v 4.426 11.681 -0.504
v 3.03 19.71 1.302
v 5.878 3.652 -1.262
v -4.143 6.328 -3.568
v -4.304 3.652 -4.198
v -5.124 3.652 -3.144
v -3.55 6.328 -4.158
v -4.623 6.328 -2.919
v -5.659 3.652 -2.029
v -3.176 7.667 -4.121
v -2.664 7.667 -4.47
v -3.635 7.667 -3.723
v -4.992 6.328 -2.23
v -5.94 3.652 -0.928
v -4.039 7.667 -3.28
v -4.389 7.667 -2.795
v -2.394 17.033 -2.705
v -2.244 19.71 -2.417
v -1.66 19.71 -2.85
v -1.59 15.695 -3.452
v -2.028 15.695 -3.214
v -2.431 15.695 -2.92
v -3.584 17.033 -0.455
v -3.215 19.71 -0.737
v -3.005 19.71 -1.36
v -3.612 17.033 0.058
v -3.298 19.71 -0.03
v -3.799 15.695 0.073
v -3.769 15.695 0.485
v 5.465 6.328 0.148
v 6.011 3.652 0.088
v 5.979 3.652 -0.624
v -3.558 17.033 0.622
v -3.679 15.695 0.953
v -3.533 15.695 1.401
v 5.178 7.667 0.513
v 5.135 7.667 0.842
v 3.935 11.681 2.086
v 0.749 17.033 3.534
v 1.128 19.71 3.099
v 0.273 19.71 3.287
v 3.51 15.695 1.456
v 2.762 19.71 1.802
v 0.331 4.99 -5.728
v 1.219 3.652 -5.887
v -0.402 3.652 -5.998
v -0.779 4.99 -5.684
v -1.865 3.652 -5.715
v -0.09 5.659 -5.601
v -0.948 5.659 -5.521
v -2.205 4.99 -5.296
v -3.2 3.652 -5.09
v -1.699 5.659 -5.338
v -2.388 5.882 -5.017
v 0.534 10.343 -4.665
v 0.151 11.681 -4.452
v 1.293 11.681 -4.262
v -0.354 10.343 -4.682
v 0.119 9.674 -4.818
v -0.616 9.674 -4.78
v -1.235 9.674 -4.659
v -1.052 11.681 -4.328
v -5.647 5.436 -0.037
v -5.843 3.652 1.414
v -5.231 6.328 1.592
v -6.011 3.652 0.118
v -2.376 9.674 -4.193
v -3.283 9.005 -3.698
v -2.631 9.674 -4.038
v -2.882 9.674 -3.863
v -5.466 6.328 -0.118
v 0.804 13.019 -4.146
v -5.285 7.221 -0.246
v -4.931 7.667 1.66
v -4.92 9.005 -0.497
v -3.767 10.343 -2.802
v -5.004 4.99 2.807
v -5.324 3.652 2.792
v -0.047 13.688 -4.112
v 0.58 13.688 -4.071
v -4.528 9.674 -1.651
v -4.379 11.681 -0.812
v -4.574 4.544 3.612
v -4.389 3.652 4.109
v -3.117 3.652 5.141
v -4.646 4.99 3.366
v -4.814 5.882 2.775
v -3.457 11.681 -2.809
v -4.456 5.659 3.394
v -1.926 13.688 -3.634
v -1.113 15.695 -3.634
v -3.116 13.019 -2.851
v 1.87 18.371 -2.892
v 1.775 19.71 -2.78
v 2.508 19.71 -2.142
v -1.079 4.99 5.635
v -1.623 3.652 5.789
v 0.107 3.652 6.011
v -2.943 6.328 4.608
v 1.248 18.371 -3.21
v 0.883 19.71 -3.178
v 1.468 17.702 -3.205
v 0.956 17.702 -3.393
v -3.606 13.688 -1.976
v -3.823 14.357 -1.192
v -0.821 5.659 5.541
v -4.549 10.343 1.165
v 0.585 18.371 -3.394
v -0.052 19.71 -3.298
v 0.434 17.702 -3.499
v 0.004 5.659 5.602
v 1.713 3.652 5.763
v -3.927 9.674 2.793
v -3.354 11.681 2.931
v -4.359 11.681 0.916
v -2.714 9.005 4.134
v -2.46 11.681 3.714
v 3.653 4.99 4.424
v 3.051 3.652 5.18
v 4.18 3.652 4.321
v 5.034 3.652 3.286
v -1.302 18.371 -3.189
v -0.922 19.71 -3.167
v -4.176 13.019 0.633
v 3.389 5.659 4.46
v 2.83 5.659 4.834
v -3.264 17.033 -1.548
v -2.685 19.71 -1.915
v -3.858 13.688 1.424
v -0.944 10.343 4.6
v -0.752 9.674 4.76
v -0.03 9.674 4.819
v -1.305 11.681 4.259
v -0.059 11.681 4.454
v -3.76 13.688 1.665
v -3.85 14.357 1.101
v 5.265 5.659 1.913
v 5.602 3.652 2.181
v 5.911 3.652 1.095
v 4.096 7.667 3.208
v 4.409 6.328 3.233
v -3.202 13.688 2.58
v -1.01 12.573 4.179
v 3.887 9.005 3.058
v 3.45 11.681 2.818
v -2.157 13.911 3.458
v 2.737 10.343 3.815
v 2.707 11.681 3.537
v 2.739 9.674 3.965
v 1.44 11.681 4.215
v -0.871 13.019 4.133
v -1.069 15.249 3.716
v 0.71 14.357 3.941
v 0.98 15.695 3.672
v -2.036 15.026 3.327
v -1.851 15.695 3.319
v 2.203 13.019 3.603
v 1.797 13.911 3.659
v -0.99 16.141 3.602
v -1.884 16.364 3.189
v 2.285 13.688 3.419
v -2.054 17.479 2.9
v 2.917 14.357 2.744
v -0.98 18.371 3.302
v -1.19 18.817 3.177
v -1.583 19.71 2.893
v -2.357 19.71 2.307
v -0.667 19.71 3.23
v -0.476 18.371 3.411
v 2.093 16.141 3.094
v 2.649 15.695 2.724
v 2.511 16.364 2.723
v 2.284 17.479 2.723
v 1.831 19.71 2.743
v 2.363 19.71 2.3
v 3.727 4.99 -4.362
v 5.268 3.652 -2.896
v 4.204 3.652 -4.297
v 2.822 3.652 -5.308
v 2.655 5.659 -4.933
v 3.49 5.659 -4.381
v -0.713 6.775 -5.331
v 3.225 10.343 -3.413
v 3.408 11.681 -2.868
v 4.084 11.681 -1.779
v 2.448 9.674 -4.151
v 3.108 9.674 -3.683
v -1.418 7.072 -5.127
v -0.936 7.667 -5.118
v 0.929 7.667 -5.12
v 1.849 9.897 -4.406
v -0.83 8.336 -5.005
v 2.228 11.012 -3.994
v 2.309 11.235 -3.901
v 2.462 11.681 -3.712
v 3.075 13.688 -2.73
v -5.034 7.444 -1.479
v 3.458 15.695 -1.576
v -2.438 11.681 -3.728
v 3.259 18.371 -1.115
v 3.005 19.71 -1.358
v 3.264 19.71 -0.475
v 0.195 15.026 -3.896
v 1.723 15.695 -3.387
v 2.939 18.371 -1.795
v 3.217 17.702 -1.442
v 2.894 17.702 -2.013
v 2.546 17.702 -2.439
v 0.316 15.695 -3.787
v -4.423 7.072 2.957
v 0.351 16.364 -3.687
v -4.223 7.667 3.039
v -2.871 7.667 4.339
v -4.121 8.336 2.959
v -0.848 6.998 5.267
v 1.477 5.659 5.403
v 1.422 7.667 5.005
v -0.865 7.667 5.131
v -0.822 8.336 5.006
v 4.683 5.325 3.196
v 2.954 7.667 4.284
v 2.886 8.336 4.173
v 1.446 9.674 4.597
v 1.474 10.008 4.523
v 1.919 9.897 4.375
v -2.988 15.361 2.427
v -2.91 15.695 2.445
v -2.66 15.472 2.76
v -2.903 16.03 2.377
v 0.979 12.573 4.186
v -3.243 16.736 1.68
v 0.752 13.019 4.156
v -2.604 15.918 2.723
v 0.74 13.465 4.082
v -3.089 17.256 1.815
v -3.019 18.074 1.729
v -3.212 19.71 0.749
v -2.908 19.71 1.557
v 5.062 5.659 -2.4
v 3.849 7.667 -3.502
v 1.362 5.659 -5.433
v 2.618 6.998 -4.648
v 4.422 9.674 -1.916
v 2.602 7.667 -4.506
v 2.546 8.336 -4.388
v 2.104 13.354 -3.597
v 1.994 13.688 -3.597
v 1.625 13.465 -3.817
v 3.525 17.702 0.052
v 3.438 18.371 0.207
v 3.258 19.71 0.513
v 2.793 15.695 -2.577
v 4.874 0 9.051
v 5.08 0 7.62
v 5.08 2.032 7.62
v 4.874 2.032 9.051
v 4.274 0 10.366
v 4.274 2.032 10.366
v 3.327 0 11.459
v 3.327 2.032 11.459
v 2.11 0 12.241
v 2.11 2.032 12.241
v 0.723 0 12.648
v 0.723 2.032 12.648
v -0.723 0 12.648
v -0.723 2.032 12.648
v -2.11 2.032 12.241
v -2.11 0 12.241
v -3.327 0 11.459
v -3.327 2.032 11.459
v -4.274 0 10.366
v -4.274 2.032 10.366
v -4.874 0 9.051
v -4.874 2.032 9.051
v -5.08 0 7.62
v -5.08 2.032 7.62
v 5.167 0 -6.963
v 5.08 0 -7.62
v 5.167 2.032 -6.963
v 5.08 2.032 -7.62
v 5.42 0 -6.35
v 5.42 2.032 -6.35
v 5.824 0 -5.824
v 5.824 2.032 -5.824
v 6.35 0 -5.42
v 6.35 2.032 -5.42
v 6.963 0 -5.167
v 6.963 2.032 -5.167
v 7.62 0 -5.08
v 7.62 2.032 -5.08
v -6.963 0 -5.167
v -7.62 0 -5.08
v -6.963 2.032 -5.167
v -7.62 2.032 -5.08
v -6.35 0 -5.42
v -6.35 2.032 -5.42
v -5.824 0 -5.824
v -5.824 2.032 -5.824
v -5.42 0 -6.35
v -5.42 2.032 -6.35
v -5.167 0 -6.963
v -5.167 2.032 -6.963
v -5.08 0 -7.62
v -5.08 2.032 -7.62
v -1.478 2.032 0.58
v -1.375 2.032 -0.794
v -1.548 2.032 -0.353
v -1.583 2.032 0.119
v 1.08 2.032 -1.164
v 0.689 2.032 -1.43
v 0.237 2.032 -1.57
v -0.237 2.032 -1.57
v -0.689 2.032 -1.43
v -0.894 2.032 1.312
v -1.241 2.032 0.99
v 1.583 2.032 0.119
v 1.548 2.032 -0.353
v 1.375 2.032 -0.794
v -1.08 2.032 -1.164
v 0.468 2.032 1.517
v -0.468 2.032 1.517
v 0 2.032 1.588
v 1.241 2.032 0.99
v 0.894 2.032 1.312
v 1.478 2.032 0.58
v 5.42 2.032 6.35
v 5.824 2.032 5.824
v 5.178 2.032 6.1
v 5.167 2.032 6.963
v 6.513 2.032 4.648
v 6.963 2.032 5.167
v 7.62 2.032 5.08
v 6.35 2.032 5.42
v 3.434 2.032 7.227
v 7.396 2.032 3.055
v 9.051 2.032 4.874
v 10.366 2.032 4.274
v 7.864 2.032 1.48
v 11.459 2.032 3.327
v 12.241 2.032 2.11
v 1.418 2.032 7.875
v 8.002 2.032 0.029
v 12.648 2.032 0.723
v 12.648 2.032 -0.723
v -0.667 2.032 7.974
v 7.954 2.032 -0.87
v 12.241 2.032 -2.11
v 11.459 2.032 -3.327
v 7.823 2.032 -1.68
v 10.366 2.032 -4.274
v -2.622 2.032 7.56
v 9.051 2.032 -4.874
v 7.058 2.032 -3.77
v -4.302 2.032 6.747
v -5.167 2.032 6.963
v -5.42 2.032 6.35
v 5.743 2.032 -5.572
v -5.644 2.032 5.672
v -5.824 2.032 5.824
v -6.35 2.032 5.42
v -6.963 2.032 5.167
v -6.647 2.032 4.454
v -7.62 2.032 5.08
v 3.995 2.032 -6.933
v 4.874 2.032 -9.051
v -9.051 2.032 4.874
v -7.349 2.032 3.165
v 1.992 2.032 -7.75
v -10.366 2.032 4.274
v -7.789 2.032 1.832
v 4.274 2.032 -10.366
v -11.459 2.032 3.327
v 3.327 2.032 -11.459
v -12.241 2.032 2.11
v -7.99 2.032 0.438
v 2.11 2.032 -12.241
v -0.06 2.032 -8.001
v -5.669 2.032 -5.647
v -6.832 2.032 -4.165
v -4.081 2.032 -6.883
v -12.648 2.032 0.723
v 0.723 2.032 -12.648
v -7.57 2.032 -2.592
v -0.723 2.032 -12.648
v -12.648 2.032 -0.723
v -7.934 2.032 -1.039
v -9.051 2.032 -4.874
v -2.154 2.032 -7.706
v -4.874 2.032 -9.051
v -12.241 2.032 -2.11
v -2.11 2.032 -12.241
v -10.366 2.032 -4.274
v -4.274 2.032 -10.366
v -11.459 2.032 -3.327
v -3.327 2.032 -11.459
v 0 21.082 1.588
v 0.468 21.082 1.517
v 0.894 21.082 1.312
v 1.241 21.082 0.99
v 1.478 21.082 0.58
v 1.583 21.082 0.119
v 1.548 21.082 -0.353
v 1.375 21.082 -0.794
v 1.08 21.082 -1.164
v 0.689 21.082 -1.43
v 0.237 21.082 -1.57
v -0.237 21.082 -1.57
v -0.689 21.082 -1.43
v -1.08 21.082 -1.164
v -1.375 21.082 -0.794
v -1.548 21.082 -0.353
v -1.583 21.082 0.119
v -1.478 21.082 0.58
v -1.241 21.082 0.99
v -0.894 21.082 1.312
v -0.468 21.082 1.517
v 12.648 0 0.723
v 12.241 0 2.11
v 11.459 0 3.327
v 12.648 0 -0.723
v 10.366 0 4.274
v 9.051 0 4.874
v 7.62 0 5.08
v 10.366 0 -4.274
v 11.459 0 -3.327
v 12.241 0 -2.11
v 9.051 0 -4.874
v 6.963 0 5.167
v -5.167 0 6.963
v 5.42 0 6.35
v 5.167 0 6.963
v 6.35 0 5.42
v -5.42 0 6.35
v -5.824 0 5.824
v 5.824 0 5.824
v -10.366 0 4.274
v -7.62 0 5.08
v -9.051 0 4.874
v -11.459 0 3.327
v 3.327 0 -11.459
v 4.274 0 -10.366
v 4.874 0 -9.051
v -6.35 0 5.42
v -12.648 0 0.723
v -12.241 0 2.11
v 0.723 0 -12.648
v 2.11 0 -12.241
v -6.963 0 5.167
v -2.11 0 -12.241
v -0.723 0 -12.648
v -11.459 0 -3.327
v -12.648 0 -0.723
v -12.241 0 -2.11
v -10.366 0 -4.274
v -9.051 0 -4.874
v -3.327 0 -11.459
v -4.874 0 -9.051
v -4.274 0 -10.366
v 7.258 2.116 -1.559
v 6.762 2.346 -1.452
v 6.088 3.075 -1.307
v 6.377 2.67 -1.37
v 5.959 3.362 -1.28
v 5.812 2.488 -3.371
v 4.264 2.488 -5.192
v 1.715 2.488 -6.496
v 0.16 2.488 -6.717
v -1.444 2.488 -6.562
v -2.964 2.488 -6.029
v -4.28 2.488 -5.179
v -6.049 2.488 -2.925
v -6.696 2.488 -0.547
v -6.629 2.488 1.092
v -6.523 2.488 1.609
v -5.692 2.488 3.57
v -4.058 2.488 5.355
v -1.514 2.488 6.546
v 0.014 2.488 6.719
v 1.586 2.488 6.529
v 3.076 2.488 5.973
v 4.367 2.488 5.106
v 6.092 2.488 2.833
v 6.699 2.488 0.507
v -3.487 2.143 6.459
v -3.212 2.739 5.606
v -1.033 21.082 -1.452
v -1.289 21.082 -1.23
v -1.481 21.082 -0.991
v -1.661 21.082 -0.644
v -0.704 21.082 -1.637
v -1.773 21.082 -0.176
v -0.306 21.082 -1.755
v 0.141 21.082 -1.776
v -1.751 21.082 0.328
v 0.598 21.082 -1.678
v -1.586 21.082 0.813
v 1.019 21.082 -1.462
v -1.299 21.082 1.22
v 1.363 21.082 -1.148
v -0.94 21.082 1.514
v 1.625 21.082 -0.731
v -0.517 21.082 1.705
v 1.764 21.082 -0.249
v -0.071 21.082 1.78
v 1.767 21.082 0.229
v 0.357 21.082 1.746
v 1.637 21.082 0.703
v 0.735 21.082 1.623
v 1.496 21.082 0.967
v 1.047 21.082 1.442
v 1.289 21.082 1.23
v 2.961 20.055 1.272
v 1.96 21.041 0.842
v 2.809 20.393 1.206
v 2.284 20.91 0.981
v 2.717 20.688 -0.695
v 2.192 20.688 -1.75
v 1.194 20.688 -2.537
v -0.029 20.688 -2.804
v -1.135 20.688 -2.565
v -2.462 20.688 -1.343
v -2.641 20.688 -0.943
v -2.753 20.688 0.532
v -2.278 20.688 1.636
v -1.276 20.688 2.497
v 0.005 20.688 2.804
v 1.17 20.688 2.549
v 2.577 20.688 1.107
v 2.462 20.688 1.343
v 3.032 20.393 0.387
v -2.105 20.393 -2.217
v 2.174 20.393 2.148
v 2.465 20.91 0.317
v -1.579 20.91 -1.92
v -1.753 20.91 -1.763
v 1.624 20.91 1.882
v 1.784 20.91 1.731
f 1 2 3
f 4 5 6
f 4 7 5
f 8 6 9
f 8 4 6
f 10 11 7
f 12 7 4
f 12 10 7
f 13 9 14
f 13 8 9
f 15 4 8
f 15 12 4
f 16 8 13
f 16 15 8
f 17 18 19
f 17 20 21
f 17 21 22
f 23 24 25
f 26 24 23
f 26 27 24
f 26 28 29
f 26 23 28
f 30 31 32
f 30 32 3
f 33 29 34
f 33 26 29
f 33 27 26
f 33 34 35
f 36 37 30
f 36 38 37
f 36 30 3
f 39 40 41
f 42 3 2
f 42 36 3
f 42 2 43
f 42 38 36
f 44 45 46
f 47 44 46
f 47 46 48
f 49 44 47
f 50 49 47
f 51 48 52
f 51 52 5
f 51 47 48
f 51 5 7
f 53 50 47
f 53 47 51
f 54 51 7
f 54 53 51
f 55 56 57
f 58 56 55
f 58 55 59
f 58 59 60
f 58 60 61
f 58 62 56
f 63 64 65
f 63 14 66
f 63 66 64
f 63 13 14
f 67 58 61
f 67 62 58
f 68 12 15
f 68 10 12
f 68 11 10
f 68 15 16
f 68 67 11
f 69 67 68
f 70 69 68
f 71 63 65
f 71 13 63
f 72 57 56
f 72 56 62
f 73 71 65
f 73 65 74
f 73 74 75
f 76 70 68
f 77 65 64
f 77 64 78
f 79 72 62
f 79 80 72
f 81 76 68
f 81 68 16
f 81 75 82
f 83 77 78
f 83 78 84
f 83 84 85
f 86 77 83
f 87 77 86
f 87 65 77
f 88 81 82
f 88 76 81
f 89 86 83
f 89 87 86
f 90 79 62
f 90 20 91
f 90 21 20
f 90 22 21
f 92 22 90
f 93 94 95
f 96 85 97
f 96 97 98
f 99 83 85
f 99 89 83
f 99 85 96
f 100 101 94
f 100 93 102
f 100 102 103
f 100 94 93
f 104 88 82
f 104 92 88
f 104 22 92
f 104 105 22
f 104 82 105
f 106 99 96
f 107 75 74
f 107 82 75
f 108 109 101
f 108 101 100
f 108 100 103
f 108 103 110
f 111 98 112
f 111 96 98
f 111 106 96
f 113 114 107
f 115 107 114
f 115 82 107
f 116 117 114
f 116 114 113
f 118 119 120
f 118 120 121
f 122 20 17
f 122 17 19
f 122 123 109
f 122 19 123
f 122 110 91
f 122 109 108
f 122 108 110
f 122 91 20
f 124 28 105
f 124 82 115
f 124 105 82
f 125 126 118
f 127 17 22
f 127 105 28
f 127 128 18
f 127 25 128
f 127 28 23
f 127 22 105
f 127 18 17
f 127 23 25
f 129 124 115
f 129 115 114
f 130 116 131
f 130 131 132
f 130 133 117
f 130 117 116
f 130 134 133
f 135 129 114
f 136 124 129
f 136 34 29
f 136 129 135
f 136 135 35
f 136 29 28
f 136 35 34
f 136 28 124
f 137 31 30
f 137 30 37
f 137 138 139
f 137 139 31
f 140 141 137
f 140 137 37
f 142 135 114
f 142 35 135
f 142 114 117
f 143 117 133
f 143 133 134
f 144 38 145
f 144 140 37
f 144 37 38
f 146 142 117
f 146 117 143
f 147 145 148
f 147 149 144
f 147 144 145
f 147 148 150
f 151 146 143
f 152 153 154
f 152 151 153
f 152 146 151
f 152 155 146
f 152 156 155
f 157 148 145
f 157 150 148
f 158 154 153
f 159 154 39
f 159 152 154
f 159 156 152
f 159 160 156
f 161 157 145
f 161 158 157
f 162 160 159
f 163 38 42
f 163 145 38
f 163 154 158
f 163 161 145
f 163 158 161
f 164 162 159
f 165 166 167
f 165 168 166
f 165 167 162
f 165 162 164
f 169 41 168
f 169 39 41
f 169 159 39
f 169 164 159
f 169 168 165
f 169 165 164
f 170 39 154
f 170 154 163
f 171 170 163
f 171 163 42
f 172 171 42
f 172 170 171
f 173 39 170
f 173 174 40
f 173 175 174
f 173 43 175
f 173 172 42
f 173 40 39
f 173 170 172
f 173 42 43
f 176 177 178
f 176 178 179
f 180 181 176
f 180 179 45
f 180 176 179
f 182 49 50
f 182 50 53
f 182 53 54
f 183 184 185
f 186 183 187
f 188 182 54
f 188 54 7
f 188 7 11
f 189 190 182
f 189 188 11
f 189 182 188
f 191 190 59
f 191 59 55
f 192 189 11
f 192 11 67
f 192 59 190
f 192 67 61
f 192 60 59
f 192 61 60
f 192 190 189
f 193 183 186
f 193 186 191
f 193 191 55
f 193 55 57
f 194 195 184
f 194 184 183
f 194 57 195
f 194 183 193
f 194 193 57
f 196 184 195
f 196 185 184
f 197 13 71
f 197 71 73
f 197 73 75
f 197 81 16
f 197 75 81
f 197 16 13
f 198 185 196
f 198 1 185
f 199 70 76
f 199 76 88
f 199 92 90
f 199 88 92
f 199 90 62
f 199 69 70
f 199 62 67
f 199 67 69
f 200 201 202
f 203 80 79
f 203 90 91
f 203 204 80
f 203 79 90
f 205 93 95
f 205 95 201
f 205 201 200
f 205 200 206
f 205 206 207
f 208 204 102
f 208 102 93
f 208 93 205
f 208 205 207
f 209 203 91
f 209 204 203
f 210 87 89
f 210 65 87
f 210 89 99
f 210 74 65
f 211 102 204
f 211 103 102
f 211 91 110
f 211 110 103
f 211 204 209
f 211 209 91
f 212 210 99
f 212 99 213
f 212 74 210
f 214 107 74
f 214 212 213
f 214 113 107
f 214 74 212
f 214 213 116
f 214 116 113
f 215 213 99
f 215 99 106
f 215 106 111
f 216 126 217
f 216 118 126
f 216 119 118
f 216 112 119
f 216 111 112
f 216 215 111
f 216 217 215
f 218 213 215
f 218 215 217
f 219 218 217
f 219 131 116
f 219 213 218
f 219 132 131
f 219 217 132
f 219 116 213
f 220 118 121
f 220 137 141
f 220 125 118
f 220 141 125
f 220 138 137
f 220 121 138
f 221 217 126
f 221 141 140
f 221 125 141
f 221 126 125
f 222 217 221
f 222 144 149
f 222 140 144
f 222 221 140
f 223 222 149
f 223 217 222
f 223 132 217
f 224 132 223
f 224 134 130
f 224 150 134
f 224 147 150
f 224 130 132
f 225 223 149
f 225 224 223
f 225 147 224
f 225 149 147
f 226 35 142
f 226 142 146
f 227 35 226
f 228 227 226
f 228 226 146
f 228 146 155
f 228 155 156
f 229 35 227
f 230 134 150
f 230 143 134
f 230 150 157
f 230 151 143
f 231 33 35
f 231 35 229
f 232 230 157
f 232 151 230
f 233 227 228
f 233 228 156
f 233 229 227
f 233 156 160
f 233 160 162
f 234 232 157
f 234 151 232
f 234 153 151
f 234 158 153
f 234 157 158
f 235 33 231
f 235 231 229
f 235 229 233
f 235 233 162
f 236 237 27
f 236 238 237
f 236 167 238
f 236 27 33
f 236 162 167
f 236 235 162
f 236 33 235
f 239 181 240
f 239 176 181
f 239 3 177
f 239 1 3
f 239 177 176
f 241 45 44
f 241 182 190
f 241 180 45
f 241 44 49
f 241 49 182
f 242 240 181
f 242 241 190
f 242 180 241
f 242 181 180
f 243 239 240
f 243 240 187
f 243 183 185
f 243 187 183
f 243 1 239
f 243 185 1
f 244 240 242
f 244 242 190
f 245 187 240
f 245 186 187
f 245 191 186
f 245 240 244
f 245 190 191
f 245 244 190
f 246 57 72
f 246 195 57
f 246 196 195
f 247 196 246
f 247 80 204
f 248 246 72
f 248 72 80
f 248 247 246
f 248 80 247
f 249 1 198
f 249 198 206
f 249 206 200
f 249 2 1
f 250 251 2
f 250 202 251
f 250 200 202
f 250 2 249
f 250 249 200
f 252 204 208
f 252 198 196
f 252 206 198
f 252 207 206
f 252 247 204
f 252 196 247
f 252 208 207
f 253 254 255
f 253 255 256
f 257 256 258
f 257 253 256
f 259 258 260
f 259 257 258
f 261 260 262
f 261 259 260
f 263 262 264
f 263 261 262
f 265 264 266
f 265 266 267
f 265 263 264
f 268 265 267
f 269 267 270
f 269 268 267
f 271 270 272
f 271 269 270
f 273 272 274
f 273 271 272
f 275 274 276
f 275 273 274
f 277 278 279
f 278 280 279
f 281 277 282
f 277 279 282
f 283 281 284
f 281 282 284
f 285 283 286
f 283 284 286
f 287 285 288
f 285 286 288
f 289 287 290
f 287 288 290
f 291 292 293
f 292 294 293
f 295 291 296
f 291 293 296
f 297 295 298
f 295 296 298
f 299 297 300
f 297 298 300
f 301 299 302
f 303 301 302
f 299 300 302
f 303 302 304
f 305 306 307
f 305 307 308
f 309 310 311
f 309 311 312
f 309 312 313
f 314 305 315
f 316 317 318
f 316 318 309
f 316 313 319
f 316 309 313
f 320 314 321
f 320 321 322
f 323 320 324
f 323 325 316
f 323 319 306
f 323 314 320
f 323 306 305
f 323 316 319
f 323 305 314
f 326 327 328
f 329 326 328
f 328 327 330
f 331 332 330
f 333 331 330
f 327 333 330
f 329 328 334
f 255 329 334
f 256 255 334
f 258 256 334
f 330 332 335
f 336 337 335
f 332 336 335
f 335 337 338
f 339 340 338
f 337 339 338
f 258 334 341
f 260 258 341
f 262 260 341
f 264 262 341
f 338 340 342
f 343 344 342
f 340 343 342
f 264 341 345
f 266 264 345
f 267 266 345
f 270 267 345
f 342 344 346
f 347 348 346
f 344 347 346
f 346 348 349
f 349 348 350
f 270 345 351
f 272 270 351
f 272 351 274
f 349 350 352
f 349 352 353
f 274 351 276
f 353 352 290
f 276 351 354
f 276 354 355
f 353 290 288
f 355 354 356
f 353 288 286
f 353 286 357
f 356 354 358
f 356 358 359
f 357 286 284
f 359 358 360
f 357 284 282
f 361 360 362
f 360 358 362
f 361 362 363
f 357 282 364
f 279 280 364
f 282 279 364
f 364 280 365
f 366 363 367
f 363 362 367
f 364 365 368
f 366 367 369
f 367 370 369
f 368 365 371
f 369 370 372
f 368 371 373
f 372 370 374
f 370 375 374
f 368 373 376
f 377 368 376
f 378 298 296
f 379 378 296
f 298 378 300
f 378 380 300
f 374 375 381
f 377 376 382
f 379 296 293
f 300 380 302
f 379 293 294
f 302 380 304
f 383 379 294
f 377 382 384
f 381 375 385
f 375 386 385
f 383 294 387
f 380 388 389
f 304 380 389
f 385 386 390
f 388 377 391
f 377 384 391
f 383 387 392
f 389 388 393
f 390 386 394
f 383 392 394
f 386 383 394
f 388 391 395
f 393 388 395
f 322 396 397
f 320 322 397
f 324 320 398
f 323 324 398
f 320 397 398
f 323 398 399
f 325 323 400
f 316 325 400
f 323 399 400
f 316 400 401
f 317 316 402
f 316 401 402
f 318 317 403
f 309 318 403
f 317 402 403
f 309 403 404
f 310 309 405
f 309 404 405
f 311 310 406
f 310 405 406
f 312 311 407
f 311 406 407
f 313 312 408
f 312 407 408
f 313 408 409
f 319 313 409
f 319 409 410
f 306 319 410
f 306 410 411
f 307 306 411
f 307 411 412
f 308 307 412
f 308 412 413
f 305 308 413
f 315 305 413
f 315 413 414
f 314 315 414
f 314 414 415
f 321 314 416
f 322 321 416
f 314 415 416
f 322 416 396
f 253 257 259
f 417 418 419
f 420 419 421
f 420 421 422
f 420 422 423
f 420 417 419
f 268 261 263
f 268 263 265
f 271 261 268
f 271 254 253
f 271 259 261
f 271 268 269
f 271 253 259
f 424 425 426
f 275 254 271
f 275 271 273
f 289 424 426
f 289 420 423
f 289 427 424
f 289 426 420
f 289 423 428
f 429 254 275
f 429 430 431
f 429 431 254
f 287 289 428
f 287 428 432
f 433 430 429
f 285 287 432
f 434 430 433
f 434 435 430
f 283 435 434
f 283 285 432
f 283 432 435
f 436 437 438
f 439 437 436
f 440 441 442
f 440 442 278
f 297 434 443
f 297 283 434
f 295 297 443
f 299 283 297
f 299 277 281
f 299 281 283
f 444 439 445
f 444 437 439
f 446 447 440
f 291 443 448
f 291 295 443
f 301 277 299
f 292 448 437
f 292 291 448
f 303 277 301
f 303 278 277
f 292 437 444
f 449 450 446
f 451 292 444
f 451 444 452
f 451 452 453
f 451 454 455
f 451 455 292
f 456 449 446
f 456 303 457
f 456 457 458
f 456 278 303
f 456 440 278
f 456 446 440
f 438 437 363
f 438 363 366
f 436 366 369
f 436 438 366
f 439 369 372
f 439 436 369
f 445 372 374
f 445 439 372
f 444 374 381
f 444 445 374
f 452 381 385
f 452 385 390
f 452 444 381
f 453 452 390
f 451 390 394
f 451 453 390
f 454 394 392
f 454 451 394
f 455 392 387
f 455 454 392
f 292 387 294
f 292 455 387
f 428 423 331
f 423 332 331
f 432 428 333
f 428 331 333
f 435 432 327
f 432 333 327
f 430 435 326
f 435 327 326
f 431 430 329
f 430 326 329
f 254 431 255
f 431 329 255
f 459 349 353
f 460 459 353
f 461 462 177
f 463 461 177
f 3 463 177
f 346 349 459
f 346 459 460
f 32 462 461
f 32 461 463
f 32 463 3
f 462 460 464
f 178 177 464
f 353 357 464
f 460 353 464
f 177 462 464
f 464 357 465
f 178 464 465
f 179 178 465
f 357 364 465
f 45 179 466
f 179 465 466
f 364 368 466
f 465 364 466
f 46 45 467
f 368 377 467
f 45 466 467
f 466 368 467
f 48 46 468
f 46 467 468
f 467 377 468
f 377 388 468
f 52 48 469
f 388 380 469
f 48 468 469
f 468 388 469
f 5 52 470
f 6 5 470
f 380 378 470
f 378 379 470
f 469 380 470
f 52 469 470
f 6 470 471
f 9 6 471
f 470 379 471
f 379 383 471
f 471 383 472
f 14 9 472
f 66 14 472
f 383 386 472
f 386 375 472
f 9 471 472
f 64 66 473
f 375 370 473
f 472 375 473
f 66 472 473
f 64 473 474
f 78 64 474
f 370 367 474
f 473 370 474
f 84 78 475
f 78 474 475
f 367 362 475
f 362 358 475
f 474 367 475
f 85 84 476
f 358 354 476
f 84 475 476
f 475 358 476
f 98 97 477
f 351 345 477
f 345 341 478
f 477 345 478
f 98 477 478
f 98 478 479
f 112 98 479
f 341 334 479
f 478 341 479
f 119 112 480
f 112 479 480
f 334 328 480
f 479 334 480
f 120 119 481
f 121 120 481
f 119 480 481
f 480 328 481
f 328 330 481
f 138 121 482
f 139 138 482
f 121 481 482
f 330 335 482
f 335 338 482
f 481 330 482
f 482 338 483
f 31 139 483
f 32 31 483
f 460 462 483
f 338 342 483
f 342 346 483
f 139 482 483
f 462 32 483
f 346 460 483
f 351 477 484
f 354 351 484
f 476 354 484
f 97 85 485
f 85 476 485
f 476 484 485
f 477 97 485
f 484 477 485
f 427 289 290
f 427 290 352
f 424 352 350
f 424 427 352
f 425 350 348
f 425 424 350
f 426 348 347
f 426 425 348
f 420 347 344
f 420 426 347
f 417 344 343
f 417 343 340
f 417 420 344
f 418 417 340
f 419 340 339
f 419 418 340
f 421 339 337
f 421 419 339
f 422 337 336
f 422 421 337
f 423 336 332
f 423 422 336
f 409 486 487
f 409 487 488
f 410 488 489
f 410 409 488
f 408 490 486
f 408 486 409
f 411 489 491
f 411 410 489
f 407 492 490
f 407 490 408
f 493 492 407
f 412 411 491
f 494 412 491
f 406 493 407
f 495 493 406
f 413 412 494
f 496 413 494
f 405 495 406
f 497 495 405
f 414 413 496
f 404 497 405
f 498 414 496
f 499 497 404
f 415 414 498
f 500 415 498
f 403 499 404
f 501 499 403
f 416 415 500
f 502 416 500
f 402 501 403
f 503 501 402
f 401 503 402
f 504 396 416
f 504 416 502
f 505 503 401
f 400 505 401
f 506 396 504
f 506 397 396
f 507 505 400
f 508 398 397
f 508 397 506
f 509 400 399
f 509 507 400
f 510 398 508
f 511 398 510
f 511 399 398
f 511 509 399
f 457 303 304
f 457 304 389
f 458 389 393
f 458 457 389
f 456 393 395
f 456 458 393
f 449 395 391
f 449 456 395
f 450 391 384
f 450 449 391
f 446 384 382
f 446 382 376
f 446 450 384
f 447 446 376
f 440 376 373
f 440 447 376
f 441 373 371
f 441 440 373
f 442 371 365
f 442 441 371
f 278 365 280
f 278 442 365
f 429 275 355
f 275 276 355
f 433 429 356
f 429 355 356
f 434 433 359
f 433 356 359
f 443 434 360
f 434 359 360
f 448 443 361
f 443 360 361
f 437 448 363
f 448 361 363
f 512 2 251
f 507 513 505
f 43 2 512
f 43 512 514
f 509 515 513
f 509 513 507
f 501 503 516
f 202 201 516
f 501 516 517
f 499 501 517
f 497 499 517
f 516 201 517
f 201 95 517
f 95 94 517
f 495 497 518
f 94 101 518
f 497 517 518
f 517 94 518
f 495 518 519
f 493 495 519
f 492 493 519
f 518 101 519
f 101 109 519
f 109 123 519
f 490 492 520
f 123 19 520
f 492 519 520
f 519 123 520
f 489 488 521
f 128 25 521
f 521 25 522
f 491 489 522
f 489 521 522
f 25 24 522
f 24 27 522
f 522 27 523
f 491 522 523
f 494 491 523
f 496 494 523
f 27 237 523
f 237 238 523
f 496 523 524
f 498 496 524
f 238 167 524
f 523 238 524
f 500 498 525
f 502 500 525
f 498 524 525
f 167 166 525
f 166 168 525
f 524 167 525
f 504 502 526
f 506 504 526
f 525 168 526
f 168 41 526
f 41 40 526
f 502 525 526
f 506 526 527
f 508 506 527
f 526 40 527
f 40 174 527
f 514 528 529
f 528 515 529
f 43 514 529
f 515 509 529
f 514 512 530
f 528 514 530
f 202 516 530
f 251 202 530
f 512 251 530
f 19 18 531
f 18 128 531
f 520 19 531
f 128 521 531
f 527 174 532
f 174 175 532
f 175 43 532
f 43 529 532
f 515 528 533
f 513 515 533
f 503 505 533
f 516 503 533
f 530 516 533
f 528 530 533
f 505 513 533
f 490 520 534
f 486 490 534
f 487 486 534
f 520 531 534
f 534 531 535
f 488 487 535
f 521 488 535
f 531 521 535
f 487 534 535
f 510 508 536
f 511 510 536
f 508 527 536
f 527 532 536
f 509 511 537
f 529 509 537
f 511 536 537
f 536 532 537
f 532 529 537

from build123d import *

# Parameters (mm, degrees)
BOSS_EXTRUDE1_DEPTH = 2.032
FILLET1_R           = 2.54
SKETCH4_R           = 1.5875
CUT_EXTRUDE1_DEPTH  = 19.05
FILLET6_R           = 2.032
FILLET7_R           = 1.524


with BuildPart() as part:
    # Sketch1 → Boss-Extrude1 (new body)
    with BuildSketch(Plane(origin=(0, 0, 0), x_dir=(1, 0, 0), z_dir=(0, 1, 0))):
        with BuildLine():
            Line((-5.08, -7.62), (-5.08, -5.08))
            Line((-5.08, -5.08), (-7.62, -5.08))
            ThreePointArc((-7.62, -5.08), (-12.7, 0), (-7.62, 5.08))
            Line((-7.62, 5.08), (-5.08, 5.08))
            Line((-5.08, 5.08), (-5.08, 7.62))
            ThreePointArc((-5.08, 7.62), (0, 12.7), (5.08, 7.62))
            Line((5.08, 7.62), (5.08, 5.08))
            Line((5.08, 5.08), (7.62, 5.08))
            ThreePointArc((7.62, 5.08), (12.7, 0), (7.62, -5.08))
            Line((7.62, -5.08), (5.08, -5.08))
            Line((5.08, -5.08), (5.08, -7.62))
            ThreePointArc((5.08, -7.62), (0, -12.7), (-5.08, -7.62))
        make_face()
    extrude(amount=BOSS_EXTRUDE1_DEPTH)

    # Fillet1
    fillet1_edges = [part.edges().sort_by_distance(p)[0] for p in [
        (-5.08, 1.016, -5.08),
        (-5.08, 1.016, 5.08),
        (5.08, 1.016, 5.08),
        (5.08, 1.016, -5.08),
    ]]
    fillet(fillet1_edges, radius=FILLET1_R - 0.0001)  # a hair under: the kernel refuses the full size

    # Loft1: read off the stored shape, not the designer's step
    # Loft1: loft between two sections, ruled curve by curve
    loft1_from = [
        Edge.make_bspline([(6.165113119, 2.032, -1.52114438), (3.12282436, 2.032, -13.851370619), (-9.207401879, 2.032, -10.809081859), (-6.165113119, 2.032, 1.52114438), (-3.12282436, 2.032, 13.851370619), (9.207401879, 2.032, 10.809081859), (6.165113119, 2.032, -1.52114438)], [0, 0, 0, 0, 0.5, 0.5, 0.5, 1, 1, 1, 1], 3, [1, 0.333333333, 0.333333333, 1, 0.333333333, 0.333333333, 1]),
    ]
    loft1_to = [
        Edge.make_bspline([(2.787065251, 21.082, 1.520819611), (5.828704472, 21.082, -4.05331089), (0.254573971, 21.082, -7.094950112), (-2.787065251, 21.082, -1.520819611), (-5.828704472, 21.082, 4.05331089), (-0.254573971, 21.082, 7.094950112), (2.787065251, 21.082, 1.520819611)], [0, 0, 0, 0, 0.5, 0.5, 0.5, 1, 1, 1, 1], 3, [1, 0.333333333, 0.333333333, 1, 0.333333333, 0.333333333, 1]),
    ]
    loft1 = Solid(Shell([*[Face.make_surface_from_curves(loft1_from[k], loft1_to[k]) for k in range(1)], Face(Wire(loft1_from)), Face(Wire(loft1_to))]))
    add(loft1)

    # Sketch4 → Cut-Extrude1 (cut)
    with BuildSketch(Plane(origin=(0, 21.082, 0), x_dir=(1, 0, 0), z_dir=(0, 1, 0))):
        with Locations(Location((0, 0, 0), (0, 0, 270))):
            Circle(SKETCH4_R)
    extrude(amount=-CUT_EXTRUDE1_DEPTH, mode=Mode.SUBTRACT)

    # Fillet6
    fillet6_edges = [part.edges().sort_by_distance(p)[0] for p in [
        (-6.165113119, 2.032, 1.52114438),
    ]]
    fillet(fillet6_edges, radius=FILLET6_R)

    # Fillet7
    fillet7_edges = [part.edges().sort_by_distance(p)[0] for p in [
        (-2.787065251, 21.082, -1.520819611),
    ]]
    fillet(fillet7_edges, radius=FILLET7_R)


solid = part.part
